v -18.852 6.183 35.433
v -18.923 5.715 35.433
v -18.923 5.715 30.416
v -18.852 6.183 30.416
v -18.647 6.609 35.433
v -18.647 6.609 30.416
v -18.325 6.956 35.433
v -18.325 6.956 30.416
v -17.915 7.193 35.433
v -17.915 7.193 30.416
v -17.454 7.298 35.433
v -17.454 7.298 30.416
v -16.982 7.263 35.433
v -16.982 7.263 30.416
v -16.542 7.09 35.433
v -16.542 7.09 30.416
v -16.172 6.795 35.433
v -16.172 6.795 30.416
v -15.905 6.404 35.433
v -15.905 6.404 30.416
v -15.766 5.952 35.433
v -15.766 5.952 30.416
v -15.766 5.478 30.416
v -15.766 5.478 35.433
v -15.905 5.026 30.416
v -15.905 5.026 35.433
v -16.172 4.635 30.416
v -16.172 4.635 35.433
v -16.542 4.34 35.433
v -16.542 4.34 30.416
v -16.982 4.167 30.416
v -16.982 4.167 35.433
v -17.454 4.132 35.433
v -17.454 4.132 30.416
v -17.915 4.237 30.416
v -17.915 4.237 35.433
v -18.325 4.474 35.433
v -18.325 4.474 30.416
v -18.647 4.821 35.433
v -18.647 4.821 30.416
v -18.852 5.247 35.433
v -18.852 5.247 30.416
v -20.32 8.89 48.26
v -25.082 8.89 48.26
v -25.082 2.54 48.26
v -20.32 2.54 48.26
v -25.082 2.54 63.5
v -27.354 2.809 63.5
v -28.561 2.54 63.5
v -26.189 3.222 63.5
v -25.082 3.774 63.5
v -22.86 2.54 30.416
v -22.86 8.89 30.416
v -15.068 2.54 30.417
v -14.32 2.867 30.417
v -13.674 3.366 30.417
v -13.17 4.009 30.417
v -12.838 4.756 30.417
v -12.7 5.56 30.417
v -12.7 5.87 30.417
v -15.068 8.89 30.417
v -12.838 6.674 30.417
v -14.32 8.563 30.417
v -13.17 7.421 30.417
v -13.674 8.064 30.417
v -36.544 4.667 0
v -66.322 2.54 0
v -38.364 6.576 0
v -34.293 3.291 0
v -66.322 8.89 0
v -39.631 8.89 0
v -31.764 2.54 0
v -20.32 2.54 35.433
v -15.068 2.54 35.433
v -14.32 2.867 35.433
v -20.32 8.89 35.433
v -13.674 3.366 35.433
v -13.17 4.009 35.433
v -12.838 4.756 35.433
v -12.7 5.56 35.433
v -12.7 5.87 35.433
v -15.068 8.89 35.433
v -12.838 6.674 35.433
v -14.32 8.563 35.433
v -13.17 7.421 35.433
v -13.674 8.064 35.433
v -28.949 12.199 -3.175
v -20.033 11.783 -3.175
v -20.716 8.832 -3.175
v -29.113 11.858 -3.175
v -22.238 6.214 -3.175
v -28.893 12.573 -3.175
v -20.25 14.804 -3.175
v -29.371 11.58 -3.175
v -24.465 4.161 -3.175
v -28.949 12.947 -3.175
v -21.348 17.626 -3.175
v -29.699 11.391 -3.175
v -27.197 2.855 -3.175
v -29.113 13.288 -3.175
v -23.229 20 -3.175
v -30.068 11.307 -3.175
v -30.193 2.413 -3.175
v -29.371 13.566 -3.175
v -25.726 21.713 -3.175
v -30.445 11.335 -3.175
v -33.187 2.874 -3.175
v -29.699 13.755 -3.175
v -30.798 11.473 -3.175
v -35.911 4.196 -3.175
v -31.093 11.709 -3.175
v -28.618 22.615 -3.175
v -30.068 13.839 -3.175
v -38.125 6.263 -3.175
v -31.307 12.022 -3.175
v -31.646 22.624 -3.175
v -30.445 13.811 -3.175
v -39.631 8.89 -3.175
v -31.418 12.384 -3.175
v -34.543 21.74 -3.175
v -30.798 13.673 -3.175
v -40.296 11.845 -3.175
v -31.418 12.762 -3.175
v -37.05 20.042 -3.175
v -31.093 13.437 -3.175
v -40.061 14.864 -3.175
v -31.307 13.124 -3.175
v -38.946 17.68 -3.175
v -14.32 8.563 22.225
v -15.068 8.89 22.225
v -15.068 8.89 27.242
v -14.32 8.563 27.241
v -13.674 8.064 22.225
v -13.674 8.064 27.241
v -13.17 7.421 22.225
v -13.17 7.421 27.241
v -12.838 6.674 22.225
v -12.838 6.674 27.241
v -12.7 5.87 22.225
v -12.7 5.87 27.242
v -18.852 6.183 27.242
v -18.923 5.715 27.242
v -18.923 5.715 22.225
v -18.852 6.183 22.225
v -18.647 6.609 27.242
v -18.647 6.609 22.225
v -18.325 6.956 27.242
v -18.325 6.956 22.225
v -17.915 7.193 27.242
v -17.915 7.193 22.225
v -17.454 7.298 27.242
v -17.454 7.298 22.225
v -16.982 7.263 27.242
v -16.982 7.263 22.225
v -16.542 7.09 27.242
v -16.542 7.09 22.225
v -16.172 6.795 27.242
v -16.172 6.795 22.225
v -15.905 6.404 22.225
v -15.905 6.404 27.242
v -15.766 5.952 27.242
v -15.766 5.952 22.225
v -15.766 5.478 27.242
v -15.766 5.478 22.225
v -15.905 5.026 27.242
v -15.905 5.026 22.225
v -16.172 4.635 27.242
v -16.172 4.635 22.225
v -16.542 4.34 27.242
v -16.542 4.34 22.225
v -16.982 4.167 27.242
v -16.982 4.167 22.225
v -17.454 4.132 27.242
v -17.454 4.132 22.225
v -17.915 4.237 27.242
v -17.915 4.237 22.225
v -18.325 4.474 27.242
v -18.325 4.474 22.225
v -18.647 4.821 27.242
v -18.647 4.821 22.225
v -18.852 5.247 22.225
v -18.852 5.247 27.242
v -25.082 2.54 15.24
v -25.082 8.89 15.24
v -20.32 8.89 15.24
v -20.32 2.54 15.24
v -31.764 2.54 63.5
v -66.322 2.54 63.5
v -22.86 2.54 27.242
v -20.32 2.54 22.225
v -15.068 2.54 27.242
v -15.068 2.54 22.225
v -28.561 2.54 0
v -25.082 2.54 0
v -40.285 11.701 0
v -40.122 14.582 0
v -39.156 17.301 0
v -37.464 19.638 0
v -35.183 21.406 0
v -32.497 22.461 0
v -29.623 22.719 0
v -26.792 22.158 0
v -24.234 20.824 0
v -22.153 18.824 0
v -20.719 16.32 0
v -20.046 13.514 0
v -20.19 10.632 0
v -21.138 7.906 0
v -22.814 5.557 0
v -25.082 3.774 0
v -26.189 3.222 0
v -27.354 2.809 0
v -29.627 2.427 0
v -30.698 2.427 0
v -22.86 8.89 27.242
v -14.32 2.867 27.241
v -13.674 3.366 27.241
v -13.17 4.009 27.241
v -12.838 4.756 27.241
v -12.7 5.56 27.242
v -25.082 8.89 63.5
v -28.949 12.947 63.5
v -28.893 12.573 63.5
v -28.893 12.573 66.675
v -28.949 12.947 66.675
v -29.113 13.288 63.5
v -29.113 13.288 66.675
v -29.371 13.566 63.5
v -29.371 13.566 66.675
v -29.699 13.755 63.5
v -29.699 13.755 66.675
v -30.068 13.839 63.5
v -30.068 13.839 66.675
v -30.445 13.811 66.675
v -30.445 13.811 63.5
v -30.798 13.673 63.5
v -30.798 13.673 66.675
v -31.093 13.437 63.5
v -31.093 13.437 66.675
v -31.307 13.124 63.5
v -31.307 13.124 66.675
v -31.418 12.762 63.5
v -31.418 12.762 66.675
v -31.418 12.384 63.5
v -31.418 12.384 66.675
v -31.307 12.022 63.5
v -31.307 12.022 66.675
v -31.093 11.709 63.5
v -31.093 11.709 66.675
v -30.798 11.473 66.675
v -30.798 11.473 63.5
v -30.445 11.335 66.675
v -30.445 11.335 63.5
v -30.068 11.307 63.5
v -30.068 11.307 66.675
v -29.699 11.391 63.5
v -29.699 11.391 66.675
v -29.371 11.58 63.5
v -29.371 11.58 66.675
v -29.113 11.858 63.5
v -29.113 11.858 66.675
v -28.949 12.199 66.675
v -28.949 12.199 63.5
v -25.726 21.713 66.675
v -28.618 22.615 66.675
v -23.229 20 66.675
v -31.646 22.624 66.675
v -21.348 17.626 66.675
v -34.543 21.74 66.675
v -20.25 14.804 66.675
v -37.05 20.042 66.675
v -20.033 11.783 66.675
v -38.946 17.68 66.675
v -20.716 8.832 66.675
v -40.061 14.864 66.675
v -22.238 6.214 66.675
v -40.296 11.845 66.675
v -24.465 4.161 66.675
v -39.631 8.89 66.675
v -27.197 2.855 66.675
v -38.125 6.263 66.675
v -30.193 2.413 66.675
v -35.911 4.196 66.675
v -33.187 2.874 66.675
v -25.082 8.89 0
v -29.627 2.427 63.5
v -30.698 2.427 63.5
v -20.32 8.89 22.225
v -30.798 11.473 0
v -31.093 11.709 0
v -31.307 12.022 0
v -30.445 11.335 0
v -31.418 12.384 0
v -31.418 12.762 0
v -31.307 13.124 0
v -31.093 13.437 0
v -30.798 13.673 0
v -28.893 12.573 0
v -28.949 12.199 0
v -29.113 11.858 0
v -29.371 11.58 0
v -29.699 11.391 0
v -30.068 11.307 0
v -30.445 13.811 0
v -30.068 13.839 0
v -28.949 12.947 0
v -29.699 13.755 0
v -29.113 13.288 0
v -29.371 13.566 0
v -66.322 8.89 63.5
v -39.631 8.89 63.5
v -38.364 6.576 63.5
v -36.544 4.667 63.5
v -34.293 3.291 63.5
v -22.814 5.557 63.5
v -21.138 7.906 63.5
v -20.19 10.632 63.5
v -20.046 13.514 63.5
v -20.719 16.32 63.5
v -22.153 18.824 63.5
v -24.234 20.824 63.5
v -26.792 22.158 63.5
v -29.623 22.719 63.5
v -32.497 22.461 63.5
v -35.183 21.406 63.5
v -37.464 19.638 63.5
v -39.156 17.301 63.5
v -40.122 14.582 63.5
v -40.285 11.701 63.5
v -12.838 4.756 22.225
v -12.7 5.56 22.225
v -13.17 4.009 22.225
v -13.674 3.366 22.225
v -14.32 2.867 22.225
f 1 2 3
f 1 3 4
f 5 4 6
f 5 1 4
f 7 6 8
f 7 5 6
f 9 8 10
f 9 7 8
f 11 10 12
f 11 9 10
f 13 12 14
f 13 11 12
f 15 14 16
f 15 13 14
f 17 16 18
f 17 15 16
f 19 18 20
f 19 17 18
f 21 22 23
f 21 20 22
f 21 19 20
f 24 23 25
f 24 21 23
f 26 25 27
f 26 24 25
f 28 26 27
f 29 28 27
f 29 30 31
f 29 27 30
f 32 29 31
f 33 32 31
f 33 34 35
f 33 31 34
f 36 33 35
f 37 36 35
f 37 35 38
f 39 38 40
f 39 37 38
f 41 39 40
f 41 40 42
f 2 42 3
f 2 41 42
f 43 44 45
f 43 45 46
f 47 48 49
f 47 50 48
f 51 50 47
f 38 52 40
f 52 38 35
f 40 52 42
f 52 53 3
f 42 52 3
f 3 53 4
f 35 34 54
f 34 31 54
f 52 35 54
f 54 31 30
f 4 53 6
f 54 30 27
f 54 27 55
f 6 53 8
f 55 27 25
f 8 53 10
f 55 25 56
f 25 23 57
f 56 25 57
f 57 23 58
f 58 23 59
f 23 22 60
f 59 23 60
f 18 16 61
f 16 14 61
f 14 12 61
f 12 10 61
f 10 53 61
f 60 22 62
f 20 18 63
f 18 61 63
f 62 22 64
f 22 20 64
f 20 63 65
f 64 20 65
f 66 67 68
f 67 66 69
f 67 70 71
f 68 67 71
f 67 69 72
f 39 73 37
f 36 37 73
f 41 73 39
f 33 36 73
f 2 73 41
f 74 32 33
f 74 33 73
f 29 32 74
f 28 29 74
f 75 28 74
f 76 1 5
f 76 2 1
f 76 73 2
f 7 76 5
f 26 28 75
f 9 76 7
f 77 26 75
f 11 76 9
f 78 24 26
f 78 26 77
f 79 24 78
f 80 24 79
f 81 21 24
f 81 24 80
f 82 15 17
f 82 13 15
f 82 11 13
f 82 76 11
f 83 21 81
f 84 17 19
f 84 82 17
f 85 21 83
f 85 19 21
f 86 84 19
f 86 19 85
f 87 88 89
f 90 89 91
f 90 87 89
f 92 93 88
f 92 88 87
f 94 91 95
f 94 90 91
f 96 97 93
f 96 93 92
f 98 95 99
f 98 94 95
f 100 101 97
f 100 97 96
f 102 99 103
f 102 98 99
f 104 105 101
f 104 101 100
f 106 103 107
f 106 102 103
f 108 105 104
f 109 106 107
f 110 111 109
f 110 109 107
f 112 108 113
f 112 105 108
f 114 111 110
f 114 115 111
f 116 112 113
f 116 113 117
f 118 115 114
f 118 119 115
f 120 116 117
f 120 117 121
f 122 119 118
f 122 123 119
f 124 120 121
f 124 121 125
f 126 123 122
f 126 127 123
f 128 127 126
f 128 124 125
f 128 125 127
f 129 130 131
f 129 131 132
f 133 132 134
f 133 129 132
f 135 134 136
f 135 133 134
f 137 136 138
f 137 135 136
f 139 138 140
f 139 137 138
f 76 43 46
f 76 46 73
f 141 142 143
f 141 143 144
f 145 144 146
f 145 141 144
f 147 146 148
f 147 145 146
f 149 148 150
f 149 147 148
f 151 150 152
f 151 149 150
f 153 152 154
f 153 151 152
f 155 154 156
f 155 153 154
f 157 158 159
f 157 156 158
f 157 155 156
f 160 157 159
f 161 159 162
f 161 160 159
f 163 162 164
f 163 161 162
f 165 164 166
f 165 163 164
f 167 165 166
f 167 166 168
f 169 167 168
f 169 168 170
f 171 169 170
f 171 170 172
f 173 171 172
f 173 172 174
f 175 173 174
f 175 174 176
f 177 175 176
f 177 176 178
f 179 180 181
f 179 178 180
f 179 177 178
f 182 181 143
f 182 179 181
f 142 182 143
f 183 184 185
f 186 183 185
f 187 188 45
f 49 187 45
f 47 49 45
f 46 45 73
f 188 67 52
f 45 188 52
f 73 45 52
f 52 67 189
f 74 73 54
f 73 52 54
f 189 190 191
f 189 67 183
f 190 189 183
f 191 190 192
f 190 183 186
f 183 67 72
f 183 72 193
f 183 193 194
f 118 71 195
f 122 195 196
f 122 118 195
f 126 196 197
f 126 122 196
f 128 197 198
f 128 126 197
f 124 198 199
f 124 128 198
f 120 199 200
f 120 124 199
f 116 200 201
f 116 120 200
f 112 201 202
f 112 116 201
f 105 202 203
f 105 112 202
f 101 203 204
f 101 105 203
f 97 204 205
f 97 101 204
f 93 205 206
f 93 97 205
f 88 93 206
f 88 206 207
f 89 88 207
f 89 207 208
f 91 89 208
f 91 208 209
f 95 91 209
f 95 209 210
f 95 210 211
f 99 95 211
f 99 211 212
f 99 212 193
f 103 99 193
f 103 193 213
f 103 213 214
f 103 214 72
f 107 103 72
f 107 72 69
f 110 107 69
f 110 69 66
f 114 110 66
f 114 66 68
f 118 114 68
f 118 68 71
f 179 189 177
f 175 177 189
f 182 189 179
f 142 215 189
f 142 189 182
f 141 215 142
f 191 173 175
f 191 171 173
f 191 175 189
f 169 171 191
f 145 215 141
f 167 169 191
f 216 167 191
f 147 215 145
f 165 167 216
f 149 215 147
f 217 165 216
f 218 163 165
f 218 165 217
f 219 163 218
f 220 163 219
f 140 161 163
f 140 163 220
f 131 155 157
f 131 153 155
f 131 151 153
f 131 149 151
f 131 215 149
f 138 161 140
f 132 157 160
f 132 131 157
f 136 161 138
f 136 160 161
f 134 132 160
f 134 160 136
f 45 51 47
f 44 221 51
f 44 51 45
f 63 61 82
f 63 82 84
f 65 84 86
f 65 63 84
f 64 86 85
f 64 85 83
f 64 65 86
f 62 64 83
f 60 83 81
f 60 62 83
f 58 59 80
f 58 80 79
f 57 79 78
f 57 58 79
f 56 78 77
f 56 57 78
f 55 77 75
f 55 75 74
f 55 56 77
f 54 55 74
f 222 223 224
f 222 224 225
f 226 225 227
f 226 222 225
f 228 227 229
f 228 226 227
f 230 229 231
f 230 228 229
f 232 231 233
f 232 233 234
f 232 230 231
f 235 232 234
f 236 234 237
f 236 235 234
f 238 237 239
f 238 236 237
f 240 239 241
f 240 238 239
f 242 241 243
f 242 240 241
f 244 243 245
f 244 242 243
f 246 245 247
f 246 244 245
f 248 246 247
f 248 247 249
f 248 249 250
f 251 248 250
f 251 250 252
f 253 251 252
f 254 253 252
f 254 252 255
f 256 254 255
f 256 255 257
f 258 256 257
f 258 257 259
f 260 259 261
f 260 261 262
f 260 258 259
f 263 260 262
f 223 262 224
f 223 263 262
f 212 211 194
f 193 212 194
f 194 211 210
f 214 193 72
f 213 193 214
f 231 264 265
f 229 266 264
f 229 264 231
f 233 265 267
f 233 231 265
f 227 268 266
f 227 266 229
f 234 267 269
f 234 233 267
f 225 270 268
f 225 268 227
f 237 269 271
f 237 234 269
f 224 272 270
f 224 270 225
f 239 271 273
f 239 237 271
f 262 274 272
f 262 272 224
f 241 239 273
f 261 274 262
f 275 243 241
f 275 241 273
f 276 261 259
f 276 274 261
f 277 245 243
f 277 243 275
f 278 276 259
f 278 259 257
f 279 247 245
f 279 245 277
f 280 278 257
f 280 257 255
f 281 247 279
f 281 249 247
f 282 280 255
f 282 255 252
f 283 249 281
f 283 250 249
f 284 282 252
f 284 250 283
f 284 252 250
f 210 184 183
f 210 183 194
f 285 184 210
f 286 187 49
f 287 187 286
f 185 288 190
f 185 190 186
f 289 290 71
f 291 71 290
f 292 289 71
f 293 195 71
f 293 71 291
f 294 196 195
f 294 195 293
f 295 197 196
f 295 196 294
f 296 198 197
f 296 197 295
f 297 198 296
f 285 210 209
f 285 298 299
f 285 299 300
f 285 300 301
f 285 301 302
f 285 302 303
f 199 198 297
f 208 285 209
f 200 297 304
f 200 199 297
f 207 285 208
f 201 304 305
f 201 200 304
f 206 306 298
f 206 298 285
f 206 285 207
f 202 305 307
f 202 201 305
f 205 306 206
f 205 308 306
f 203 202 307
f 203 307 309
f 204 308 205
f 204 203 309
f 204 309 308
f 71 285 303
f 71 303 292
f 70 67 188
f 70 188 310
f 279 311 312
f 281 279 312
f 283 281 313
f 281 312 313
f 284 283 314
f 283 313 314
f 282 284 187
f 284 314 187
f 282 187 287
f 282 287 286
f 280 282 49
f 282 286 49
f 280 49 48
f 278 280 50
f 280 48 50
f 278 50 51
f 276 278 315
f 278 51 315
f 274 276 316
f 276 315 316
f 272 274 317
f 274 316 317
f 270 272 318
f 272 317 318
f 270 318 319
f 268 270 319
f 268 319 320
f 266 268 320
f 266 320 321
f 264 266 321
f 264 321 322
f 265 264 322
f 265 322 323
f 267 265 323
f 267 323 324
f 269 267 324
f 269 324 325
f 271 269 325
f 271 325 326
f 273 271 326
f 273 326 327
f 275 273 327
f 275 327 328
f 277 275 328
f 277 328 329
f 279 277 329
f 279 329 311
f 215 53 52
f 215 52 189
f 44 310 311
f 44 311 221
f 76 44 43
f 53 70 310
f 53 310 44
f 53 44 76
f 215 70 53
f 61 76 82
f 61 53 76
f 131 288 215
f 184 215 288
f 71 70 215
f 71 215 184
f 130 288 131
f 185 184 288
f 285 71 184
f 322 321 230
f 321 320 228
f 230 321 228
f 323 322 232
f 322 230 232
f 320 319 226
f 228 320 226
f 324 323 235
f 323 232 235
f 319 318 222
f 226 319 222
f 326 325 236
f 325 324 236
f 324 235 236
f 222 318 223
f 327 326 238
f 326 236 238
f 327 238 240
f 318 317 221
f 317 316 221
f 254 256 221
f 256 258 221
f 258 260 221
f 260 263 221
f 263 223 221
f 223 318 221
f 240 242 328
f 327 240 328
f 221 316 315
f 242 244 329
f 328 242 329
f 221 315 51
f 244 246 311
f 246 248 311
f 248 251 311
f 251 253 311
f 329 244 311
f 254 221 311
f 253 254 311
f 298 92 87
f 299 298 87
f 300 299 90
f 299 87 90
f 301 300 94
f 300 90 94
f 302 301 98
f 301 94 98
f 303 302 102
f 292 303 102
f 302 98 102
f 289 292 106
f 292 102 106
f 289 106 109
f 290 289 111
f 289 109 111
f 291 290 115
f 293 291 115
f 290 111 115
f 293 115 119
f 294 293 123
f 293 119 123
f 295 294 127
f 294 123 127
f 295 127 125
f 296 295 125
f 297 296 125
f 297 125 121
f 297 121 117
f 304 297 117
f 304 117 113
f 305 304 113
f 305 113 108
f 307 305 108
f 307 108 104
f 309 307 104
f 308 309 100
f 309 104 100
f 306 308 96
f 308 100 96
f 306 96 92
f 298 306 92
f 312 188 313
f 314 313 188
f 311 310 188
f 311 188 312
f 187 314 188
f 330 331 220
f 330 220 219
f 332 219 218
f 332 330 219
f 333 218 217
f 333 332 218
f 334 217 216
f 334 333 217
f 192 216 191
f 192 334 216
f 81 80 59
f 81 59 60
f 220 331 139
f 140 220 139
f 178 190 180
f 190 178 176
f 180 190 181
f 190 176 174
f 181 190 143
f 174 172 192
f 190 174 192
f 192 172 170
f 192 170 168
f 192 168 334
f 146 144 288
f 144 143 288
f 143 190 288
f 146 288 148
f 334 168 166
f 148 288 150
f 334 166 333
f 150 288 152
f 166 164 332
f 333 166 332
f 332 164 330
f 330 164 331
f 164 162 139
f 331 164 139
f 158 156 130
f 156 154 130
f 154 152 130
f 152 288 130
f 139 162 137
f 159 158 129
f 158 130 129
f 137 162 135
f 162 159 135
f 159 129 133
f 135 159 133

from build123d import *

# Parameters (mm, degrees)
SKETCH1_W                = 53.621579066
SKETCH1_H                = 6.35
BOSS_EXTRUDE2_DEPTH      = 63.5
CUT_EXTRUDE2_DEPTH       = 93.248761228
CUT_EXTRUDE2_DEPTH_BACK  = 0.762
SKETCH3_R                = 1.5875
SKETCH5_R                = 10.16
SKETCH5_R_2              = 1.27
BOSS_EXTRUDE3_DEPTH      = 3.175
BOSS_EXTRUDE4_START      = 3.175
SKETCH6_R                = 10.16
SKETCH6_R_2              = 1.27
BOSS_EXTRUDE4_DEPTH      = 3.175
SKETCH11_W               = 7.62
SKETCH11_H               = 22.225
SKETCH11_H_2             = 28.067
SKETCH11_W_2             = 10.16
SKETCH11_H_3             = 3.175
CUT_EXTRUDE10_DEPTH      = 96.056489111
CUT_EXTRUDE11_DEPTH      = 81.036983958
CUT_EXTRUDE11_DEPTH_BACK = 81.036983958
SKETCH12_W               = 4.7625
SKETCH12_H               = 15.24
CUT_EXTRUDE12_DEPTH      = 96.056489111


with BuildPart() as part:
    # Sketch1 → Boss-Extrude2 (new body)
    with BuildSketch(Plane.XY):
        with Locations((-39.51078952, 5.715)):
            Rectangle(SKETCH1_W, SKETCH1_H)
    extrude(amount=BOSS_EXTRUDE2_DEPTH)

    # Sketch3 → Cut-Extrude2 (cut, two sides: drawn at the far end of the back side and taken through both)
    with BuildSketch(Plane(origin=(0, 0, 63.5), x_dir=(-1, 0, 0), z_dir=(0, 0, -1)).offset(-CUT_EXTRUDE2_DEPTH_BACK)):
        with Locations((17.3355, 5.715)):
            Circle(SKETCH3_R)
    extrude(amount=CUT_EXTRUDE2_DEPTH + CUT_EXTRUDE2_DEPTH_BACK, mode=Mode.SUBTRACT)

    # Sketch5 → Boss-Extrude3 (add)
    with BuildSketch(Plane.XY.offset(63.5)):
        with Locations(Location((-30.1625, 12.573, 0), (0, 0, 201.253809185))):
            Circle(SKETCH5_R)
        with Locations((-30.1625, 12.573)):
            Circle(SKETCH5_R_2, mode=Mode.SUBTRACT)
    extrude(amount=BOSS_EXTRUDE3_DEPTH)

    # Sketch6 → Boss-Extrude4 (add)
    with BuildSketch(Plane(origin=(0, 0, 0), x_dir=(-1, 0, 0), z_dir=(0, 0, -1)).offset(BOSS_EXTRUDE4_START)):
        with Locations(Location((30.1625, 12.573, 0), (0, 0, 338.746190815))):
            Circle(SKETCH6_R)
        with Locations(Location((30.1625, 12.573, 0), (0, 0, 180))):
            Circle(SKETCH6_R_2, mode=Mode.SUBTRACT)
    extrude(amount=-BOSS_EXTRUDE4_DEPTH)

    # Sketch11 → Cut-Extrude10 (cut, through all)
    with BuildSketch(Plane(origin=(0, 8.89, 0), x_dir=(1, 0, 0), z_dir=(0, 1, 0))):
        with Locations((-16.509999987, -11.1125)):
            Rectangle(SKETCH11_W, SKETCH11_H)
        with Locations((-16.509999987, -49.4665)):
            Rectangle(SKETCH11_W, SKETCH11_H_2)
        with Locations((-17.779999987, -28.829)):
            Rectangle(SKETCH11_W_2, SKETCH11_H_3)
    extrude(amount=-CUT_EXTRUDE10_DEPTH, mode=Mode.SUBTRACT)

    # Sketch10 → Cut-Extrude11 (cut, two sides: drawn at the far end of the back side and taken through both)
    with BuildSketch(Plane.XY.offset(35.433).offset(-CUT_EXTRUDE11_DEPTH_BACK)):
        with BuildLine():
            Line((-12.699999987, 8.89), (-15.068097359, 8.89))
            ThreePointArc((-15.068097359, 8.89), (-13.401759428, 7.757904548), (-12.699999987, 5.86955715))
            Line((-12.699999987, 5.86955715), (-12.699999987, 8.89))
        make_face()
        with BuildLine():
            Line((-12.699999987, 2.54), (-12.699999987, 5.56044285))
            ThreePointArc((-12.699999987, 5.56044285), (-13.401759428, 3.672095452), (-15.068097359, 2.54))
            Line((-15.068097359, 2.54), (-12.699999987, 2.54))
        make_face()
    extrude(amount=CUT_EXTRUDE11_DEPTH + CUT_EXTRUDE11_DEPTH_BACK, mode=Mode.SUBTRACT)

    # Sketch12 → Cut-Extrude12 (cut, through all)
    with BuildSketch(Plane(origin=(0, 8.89, 0), x_dir=(1, 0, 0), z_dir=(0, 1, 0))):
        with Locations((-22.701249987, -7.62)):
            Rectangle(SKETCH12_W, SKETCH12_H)
        with Locations((-22.701249987, -55.88)):
            Rectangle(SKETCH12_W, SKETCH12_H)
    extrude(amount=-CUT_EXTRUDE12_DEPTH, mode=Mode.SUBTRACT)


solid = part.part
